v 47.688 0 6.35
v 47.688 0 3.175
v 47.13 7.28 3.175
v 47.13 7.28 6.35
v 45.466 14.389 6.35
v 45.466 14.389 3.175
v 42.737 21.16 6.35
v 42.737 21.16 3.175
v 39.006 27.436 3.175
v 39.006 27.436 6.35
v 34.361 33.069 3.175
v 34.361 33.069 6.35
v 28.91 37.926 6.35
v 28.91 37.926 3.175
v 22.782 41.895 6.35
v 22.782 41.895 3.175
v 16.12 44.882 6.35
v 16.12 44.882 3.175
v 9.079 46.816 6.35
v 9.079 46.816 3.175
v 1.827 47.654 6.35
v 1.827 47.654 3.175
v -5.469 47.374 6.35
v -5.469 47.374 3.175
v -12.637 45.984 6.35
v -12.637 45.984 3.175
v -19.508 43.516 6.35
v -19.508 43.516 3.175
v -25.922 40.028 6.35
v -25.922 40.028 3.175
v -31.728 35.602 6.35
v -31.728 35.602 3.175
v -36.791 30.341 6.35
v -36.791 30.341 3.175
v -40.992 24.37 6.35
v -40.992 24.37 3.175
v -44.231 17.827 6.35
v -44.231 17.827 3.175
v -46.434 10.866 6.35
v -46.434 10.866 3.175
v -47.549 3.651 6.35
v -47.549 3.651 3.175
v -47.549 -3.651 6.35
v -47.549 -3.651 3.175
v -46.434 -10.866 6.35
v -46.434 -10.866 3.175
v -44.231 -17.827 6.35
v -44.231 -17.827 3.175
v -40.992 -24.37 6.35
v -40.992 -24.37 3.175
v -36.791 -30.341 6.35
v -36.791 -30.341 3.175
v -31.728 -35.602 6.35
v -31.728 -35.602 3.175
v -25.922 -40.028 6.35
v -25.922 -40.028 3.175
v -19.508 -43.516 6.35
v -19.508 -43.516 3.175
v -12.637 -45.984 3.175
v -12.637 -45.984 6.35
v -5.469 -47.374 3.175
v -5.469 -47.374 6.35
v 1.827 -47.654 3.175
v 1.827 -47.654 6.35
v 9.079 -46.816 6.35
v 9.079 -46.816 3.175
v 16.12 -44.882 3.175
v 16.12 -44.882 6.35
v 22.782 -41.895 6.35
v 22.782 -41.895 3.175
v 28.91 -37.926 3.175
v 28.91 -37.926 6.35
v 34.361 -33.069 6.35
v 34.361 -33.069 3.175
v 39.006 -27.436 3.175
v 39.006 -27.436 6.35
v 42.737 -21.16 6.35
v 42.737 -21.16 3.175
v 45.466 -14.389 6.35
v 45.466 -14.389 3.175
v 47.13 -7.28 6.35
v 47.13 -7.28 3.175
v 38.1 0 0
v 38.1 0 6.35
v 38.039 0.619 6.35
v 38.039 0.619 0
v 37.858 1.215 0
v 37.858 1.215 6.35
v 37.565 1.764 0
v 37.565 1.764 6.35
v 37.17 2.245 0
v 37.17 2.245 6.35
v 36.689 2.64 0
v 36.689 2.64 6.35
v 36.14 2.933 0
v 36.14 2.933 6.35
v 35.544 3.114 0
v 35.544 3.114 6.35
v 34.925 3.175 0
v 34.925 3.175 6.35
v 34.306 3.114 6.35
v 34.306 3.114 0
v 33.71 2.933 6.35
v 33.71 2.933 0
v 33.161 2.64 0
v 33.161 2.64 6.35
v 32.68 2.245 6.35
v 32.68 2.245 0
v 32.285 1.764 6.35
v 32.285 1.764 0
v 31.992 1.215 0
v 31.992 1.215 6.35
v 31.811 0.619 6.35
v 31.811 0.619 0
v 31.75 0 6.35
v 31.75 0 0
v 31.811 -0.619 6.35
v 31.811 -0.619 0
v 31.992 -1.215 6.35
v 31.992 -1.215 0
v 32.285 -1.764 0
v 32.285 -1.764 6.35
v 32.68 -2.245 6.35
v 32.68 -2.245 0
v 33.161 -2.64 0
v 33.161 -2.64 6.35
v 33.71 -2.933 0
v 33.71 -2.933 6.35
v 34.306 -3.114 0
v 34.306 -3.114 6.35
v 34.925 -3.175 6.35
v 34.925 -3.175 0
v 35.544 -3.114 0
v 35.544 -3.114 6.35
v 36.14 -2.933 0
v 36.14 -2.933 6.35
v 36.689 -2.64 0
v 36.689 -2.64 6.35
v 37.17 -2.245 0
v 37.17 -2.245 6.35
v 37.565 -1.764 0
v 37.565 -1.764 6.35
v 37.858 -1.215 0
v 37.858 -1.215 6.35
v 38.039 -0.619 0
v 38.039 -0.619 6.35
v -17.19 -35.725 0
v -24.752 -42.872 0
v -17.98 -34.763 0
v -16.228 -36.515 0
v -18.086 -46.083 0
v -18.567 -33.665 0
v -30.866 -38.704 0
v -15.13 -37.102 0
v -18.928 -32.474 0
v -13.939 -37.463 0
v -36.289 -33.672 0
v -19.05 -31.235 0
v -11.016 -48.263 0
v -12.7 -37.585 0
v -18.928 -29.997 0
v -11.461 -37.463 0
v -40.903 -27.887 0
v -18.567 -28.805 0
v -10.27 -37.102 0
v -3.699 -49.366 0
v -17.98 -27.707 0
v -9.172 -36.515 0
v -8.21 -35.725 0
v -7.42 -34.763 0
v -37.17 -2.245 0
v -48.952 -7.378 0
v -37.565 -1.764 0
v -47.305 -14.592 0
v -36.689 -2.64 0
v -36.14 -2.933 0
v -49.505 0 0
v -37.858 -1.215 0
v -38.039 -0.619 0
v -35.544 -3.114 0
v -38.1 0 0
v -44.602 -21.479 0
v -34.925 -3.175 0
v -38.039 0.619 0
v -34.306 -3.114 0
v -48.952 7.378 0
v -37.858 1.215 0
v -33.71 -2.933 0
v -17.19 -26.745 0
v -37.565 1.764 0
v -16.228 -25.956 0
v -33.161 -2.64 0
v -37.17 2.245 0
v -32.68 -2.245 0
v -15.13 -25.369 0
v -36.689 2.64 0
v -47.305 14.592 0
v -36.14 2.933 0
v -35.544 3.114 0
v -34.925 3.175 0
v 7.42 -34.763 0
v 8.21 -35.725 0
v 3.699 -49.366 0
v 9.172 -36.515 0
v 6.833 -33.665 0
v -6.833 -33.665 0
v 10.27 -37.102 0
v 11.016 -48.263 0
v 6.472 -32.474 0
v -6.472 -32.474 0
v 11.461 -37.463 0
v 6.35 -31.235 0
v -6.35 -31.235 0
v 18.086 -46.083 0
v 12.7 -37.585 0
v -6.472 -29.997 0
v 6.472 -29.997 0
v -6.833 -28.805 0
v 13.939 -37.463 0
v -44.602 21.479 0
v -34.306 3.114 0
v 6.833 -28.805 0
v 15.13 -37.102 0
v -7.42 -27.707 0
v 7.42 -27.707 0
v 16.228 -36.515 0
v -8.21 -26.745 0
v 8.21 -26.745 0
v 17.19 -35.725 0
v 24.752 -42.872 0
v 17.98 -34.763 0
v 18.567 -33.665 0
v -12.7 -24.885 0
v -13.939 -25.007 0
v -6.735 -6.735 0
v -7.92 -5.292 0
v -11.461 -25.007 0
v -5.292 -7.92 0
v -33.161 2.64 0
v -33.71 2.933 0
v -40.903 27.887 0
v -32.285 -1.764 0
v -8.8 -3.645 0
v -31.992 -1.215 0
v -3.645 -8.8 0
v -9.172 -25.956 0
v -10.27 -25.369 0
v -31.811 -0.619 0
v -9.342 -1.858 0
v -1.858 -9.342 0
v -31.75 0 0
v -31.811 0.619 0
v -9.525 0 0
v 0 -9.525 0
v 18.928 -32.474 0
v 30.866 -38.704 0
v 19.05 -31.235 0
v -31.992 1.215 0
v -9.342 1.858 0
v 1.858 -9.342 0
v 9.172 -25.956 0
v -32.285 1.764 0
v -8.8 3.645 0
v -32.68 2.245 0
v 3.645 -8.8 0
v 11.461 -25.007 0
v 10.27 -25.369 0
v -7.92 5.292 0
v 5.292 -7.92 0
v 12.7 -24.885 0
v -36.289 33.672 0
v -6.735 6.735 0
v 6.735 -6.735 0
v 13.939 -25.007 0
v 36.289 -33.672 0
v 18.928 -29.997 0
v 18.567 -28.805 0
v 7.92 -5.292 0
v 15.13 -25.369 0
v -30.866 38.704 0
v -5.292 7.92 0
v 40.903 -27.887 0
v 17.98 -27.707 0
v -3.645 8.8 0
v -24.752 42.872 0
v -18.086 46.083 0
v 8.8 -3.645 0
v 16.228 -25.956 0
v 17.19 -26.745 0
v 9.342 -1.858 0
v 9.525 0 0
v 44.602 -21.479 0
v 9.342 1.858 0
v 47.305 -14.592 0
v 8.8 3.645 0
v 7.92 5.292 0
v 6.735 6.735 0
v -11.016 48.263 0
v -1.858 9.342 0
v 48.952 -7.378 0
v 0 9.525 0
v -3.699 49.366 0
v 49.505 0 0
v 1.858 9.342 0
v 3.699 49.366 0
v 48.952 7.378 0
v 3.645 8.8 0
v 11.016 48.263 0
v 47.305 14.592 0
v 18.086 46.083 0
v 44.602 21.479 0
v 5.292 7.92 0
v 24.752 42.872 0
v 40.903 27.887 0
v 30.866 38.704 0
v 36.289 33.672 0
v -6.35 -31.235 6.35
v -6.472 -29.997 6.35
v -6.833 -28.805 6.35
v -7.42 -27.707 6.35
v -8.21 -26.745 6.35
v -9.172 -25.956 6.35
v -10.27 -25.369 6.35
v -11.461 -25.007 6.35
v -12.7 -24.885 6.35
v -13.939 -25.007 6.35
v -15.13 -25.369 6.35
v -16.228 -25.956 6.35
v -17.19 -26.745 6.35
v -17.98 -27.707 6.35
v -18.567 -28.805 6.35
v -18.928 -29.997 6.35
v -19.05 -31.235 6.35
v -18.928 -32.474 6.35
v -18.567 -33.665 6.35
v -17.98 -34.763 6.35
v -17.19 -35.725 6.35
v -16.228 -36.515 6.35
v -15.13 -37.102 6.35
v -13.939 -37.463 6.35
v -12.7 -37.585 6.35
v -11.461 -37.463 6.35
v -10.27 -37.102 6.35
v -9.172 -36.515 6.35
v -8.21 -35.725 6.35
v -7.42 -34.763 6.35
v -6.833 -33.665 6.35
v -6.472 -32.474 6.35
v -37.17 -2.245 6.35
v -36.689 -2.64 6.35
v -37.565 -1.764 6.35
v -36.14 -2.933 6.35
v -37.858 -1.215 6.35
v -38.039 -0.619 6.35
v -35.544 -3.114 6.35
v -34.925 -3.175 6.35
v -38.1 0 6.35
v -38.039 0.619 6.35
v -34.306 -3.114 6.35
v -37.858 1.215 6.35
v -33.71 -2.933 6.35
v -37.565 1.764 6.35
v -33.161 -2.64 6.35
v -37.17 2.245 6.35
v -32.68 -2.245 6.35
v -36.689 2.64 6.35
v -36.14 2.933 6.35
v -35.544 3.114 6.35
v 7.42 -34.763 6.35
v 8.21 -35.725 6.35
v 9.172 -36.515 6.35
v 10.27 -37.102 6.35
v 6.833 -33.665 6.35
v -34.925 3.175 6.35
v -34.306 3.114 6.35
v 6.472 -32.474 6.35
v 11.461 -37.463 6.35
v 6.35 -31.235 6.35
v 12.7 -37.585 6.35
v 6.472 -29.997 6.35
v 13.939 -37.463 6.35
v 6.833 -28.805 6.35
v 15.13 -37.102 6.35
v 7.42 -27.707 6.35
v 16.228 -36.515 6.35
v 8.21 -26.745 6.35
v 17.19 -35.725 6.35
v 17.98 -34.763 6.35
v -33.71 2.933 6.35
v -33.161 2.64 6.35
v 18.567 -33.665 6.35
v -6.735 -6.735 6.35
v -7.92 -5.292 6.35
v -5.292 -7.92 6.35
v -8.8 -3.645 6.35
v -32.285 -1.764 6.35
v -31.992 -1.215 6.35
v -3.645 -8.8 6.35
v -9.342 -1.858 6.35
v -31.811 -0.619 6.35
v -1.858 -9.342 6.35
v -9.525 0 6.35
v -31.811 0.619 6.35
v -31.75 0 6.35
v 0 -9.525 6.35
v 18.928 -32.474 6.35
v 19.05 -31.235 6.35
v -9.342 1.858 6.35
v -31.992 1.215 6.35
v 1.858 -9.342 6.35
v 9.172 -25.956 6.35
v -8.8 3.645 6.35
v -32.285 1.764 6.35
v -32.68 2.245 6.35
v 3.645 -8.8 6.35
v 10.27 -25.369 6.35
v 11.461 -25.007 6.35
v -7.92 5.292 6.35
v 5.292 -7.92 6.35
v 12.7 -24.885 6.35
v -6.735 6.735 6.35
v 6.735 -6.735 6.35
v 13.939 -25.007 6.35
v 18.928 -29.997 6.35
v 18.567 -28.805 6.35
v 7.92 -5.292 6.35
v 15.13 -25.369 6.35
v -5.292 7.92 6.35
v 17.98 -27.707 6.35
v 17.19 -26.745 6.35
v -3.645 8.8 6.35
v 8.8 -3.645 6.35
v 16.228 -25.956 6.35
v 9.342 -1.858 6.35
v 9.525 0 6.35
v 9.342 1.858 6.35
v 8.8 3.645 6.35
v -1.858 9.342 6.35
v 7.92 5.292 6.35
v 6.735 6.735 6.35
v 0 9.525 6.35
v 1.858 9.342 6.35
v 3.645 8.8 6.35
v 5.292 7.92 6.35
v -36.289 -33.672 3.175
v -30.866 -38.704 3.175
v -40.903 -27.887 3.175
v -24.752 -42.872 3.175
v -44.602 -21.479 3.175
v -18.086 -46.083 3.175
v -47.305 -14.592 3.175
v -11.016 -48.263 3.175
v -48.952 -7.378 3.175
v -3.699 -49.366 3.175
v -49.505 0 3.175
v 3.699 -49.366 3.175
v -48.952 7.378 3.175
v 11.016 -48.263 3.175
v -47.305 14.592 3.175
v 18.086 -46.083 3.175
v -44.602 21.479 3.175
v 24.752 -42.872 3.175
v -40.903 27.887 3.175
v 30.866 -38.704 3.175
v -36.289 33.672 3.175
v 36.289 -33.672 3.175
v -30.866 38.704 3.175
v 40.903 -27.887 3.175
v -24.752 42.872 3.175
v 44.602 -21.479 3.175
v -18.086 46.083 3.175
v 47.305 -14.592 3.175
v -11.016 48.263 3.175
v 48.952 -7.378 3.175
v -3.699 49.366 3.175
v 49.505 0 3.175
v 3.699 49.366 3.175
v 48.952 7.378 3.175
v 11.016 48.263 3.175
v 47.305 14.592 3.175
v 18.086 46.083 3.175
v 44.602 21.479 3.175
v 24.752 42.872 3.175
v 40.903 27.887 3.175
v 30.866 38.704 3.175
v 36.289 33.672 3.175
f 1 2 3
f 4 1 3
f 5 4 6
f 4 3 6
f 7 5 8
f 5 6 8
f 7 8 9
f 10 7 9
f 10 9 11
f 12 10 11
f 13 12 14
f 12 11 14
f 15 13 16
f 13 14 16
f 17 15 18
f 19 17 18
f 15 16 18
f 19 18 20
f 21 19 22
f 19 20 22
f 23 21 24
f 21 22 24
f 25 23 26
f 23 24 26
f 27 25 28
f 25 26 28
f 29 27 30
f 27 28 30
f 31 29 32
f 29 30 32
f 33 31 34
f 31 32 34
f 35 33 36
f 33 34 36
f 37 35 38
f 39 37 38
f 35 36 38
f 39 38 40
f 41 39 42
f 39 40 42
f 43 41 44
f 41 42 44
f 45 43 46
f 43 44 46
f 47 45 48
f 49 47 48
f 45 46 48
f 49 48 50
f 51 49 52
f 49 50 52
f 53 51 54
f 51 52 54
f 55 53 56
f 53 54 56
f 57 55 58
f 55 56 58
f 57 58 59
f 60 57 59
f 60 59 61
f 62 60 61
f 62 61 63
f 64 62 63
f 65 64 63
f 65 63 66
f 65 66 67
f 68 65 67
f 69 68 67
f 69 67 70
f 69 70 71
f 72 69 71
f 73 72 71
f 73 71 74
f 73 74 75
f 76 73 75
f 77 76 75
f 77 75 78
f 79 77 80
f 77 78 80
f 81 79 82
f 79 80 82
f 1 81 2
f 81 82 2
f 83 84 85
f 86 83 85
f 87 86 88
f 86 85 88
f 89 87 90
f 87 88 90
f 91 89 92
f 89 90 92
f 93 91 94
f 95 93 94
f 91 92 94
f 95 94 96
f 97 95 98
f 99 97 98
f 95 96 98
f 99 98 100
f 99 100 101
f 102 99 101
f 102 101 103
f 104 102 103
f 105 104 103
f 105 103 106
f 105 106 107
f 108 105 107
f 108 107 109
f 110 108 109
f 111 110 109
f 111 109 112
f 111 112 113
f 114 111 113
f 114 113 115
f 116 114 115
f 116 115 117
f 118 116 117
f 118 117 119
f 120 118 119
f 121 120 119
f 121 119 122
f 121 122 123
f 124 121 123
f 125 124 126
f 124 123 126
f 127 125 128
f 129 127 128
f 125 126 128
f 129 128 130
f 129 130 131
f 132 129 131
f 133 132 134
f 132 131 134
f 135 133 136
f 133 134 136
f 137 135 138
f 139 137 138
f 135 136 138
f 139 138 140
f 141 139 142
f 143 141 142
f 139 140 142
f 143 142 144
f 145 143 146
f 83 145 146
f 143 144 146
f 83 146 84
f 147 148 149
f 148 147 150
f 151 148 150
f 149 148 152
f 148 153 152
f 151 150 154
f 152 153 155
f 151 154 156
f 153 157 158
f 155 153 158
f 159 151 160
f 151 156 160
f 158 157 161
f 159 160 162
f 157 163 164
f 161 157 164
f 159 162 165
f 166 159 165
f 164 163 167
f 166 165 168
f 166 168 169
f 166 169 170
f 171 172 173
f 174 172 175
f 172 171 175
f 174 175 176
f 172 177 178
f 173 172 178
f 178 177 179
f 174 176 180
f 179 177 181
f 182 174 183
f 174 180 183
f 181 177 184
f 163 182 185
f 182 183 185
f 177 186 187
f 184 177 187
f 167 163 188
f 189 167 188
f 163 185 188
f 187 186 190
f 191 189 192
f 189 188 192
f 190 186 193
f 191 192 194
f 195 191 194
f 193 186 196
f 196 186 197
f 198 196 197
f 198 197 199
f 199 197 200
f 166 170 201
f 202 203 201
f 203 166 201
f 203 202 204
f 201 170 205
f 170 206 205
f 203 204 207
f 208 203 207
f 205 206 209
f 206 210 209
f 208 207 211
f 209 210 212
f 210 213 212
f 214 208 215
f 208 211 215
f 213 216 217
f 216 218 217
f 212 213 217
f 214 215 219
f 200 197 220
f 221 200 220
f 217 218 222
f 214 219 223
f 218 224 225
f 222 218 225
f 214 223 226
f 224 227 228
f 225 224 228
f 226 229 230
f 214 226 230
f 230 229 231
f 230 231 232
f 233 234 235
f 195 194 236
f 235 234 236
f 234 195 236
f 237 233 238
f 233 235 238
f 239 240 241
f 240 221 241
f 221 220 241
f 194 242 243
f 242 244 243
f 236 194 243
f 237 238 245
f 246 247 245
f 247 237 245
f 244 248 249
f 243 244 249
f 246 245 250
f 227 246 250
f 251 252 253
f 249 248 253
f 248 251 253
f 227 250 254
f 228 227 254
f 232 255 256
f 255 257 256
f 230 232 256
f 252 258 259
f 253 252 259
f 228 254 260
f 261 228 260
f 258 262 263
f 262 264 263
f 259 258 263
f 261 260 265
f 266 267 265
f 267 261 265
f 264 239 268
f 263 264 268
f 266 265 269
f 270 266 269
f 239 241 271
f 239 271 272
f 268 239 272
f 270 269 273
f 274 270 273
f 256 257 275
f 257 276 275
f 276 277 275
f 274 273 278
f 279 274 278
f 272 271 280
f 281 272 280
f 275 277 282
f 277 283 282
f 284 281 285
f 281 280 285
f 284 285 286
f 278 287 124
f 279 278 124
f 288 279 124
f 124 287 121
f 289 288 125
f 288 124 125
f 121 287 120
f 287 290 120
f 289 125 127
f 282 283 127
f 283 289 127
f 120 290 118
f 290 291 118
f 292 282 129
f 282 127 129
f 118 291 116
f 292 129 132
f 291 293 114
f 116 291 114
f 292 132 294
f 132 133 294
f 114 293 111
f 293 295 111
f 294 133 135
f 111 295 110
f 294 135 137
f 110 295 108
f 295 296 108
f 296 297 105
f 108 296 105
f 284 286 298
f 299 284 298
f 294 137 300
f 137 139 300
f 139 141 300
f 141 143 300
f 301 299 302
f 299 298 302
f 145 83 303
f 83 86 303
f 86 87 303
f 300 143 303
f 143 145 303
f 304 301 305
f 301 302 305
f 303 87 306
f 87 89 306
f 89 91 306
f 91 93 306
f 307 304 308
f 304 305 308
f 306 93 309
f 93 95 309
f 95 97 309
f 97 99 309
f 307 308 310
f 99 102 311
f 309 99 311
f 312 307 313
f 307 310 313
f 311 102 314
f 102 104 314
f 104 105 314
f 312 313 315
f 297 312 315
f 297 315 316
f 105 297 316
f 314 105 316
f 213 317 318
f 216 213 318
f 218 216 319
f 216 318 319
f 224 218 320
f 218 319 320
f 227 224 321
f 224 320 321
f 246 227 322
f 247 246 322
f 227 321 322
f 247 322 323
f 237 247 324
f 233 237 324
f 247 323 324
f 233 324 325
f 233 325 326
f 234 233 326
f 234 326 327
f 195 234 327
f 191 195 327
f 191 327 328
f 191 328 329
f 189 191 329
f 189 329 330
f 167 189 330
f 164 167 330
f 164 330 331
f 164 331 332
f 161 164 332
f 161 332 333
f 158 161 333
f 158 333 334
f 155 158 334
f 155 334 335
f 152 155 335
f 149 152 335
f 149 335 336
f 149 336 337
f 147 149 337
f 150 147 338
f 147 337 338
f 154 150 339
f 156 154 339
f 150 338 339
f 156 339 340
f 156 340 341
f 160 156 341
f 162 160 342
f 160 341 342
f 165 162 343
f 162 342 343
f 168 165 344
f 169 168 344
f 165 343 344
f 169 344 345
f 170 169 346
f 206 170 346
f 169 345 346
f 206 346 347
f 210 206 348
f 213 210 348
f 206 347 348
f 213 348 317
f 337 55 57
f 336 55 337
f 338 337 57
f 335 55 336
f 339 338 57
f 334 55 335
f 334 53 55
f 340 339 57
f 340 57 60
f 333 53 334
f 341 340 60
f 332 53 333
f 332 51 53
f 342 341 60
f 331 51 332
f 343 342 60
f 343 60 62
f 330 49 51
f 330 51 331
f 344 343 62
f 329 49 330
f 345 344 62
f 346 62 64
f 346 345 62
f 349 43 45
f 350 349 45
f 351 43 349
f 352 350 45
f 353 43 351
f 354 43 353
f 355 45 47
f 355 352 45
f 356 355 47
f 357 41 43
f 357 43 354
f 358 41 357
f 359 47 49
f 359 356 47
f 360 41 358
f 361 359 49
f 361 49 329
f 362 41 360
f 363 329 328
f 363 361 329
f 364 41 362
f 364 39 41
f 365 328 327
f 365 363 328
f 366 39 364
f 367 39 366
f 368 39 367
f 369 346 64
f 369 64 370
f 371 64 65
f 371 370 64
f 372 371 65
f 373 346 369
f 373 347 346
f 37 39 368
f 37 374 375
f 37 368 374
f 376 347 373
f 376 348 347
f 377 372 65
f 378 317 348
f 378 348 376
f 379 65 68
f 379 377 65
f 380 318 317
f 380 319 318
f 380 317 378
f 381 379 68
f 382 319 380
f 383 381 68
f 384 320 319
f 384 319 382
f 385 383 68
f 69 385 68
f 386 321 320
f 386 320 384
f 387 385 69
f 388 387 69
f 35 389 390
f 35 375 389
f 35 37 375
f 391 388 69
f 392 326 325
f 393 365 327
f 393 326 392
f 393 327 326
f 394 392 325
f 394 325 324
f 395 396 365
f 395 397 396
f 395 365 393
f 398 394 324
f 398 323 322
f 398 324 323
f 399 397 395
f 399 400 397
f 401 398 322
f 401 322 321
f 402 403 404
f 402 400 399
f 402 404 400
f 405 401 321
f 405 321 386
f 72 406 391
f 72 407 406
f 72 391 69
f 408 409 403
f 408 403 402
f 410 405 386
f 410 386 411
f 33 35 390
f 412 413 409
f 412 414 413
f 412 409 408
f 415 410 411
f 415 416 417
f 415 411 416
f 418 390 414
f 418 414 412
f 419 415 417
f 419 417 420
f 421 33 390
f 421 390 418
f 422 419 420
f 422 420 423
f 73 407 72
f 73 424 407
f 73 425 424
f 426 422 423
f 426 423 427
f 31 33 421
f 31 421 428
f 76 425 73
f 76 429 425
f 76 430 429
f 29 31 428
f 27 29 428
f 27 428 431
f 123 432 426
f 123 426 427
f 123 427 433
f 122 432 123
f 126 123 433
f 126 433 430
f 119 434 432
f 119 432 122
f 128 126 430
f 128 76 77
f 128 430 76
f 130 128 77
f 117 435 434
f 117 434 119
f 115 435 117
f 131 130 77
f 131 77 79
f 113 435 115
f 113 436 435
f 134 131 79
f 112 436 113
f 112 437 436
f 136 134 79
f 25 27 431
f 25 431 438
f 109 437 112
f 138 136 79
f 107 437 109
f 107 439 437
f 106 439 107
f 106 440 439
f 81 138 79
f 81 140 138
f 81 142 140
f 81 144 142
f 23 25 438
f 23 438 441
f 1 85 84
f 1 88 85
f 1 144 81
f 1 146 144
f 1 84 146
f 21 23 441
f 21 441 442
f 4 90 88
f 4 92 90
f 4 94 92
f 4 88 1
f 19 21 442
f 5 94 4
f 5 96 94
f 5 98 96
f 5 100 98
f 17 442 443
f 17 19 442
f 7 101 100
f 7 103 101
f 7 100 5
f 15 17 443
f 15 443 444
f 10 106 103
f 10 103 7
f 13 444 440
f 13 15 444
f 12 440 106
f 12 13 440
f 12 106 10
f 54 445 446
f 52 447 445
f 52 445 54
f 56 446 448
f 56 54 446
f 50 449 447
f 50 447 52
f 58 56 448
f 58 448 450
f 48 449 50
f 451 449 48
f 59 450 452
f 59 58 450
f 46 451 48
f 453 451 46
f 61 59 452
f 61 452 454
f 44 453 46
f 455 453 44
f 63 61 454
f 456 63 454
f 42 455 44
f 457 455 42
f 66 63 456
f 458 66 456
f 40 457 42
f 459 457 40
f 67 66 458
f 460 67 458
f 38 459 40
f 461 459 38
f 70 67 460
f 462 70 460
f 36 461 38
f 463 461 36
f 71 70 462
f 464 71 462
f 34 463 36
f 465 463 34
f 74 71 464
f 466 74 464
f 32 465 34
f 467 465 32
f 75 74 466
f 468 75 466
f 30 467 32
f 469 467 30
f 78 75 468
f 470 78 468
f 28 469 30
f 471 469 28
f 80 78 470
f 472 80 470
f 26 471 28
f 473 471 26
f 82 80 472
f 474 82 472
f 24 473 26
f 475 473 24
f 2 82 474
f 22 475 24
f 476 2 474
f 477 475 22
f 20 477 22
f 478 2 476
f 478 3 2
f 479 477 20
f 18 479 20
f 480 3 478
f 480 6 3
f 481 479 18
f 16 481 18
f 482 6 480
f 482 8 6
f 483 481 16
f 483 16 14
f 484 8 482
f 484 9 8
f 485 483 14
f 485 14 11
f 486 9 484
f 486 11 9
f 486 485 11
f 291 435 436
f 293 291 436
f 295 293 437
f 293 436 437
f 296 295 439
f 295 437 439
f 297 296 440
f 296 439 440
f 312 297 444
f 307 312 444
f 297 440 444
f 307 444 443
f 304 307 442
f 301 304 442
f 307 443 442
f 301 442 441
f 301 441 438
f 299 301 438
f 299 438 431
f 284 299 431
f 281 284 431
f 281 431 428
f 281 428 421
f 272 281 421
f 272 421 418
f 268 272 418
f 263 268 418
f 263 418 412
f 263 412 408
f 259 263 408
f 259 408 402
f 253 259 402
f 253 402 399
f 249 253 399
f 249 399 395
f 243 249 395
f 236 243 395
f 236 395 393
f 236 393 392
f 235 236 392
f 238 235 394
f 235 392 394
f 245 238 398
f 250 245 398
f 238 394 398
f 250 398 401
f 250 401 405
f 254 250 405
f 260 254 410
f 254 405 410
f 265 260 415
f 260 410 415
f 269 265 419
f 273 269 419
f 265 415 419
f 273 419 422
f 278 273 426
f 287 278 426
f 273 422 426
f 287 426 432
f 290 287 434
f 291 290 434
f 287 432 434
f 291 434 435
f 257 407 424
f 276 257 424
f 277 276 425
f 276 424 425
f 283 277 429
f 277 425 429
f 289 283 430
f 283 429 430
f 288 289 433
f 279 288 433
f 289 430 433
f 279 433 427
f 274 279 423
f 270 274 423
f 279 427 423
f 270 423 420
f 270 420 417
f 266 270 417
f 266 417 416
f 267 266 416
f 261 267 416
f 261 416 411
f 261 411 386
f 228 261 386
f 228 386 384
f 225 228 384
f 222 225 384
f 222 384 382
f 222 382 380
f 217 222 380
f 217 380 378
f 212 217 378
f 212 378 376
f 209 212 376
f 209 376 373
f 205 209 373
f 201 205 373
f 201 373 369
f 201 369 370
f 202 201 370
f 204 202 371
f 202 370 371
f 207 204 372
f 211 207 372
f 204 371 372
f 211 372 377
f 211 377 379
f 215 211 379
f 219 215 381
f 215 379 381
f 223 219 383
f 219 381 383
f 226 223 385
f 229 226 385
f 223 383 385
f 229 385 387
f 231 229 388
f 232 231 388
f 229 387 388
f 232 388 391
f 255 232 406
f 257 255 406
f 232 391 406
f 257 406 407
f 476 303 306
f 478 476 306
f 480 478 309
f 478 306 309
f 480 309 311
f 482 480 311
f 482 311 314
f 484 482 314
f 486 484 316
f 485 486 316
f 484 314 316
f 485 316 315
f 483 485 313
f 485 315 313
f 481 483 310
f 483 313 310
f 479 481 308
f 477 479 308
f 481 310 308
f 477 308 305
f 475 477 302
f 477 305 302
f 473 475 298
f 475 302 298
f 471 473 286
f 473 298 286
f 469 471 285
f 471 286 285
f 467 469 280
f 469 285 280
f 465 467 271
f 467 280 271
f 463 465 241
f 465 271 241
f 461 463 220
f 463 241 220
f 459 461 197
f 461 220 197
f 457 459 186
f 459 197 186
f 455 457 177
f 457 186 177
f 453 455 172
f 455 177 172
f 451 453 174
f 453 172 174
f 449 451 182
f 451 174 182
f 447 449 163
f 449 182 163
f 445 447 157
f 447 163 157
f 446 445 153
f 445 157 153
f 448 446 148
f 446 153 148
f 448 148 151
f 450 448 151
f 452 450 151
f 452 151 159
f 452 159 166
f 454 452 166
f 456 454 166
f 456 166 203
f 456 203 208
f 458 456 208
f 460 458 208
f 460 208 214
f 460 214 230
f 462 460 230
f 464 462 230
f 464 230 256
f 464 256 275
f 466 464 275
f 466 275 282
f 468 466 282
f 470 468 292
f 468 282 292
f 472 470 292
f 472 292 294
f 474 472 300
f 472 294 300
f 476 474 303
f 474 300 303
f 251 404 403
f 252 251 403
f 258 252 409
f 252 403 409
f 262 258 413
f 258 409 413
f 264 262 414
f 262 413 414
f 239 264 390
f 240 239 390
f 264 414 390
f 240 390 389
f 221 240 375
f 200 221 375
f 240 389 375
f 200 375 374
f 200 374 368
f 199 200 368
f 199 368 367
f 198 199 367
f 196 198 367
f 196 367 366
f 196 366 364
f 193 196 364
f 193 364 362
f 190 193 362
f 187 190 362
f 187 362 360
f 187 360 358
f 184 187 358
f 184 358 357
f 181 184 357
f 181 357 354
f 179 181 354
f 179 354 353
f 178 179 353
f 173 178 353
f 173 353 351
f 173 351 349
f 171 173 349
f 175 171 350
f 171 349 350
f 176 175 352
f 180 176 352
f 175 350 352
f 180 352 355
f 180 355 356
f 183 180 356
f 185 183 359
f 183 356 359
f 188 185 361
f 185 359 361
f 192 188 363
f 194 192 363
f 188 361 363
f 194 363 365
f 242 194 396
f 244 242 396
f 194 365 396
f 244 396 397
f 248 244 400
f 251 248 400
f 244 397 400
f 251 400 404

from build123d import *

# Parameters (mm, degrees)
SKETCH1_R           = 49.5046
BOSS_EXTRUDE1_DEPTH = 3.175
SKETCH2_R           = 47.6885
BOSS_EXTRUDE2_DEPTH = 3.175
SKETCH3_R           = 6.35
SKETCH3_R_2         = 3.175
SKETCH3_R_3         = 9.525
CUT_EXTRUDE1_DEPTH  = 71.297463271


with BuildPart() as part:
    # Sketch1 → Boss-Extrude1 (new body)
    with BuildSketch(Plane.XY):
        Circle(SKETCH1_R)
    extrude(amount=BOSS_EXTRUDE1_DEPTH)

    # Sketch2 → Boss-Extrude2 (add)
    with BuildSketch(Plane.XY.offset(3.175)):
        Circle(SKETCH2_R)
    extrude(amount=BOSS_EXTRUDE2_DEPTH)

    # Sketch3 → Cut-Extrude1 (cut, through all)
    with BuildSketch(Plane.XY.offset(6.35)):
        with Locations((-12.7, -31.235352443)):
            Circle(SKETCH3_R)
        with Locations((12.7, -31.235352443)):
            Circle(SKETCH3_R)
        with Locations((-34.925, 0)):
            Circle(SKETCH3_R_2)
        with Locations((34.925, 0)):
            Circle(SKETCH3_R_2)
        Circle(SKETCH3_R_3)
    extrude(amount=-CUT_EXTRUDE1_DEPTH, mode=Mode.SUBTRACT)


solid = part.part
